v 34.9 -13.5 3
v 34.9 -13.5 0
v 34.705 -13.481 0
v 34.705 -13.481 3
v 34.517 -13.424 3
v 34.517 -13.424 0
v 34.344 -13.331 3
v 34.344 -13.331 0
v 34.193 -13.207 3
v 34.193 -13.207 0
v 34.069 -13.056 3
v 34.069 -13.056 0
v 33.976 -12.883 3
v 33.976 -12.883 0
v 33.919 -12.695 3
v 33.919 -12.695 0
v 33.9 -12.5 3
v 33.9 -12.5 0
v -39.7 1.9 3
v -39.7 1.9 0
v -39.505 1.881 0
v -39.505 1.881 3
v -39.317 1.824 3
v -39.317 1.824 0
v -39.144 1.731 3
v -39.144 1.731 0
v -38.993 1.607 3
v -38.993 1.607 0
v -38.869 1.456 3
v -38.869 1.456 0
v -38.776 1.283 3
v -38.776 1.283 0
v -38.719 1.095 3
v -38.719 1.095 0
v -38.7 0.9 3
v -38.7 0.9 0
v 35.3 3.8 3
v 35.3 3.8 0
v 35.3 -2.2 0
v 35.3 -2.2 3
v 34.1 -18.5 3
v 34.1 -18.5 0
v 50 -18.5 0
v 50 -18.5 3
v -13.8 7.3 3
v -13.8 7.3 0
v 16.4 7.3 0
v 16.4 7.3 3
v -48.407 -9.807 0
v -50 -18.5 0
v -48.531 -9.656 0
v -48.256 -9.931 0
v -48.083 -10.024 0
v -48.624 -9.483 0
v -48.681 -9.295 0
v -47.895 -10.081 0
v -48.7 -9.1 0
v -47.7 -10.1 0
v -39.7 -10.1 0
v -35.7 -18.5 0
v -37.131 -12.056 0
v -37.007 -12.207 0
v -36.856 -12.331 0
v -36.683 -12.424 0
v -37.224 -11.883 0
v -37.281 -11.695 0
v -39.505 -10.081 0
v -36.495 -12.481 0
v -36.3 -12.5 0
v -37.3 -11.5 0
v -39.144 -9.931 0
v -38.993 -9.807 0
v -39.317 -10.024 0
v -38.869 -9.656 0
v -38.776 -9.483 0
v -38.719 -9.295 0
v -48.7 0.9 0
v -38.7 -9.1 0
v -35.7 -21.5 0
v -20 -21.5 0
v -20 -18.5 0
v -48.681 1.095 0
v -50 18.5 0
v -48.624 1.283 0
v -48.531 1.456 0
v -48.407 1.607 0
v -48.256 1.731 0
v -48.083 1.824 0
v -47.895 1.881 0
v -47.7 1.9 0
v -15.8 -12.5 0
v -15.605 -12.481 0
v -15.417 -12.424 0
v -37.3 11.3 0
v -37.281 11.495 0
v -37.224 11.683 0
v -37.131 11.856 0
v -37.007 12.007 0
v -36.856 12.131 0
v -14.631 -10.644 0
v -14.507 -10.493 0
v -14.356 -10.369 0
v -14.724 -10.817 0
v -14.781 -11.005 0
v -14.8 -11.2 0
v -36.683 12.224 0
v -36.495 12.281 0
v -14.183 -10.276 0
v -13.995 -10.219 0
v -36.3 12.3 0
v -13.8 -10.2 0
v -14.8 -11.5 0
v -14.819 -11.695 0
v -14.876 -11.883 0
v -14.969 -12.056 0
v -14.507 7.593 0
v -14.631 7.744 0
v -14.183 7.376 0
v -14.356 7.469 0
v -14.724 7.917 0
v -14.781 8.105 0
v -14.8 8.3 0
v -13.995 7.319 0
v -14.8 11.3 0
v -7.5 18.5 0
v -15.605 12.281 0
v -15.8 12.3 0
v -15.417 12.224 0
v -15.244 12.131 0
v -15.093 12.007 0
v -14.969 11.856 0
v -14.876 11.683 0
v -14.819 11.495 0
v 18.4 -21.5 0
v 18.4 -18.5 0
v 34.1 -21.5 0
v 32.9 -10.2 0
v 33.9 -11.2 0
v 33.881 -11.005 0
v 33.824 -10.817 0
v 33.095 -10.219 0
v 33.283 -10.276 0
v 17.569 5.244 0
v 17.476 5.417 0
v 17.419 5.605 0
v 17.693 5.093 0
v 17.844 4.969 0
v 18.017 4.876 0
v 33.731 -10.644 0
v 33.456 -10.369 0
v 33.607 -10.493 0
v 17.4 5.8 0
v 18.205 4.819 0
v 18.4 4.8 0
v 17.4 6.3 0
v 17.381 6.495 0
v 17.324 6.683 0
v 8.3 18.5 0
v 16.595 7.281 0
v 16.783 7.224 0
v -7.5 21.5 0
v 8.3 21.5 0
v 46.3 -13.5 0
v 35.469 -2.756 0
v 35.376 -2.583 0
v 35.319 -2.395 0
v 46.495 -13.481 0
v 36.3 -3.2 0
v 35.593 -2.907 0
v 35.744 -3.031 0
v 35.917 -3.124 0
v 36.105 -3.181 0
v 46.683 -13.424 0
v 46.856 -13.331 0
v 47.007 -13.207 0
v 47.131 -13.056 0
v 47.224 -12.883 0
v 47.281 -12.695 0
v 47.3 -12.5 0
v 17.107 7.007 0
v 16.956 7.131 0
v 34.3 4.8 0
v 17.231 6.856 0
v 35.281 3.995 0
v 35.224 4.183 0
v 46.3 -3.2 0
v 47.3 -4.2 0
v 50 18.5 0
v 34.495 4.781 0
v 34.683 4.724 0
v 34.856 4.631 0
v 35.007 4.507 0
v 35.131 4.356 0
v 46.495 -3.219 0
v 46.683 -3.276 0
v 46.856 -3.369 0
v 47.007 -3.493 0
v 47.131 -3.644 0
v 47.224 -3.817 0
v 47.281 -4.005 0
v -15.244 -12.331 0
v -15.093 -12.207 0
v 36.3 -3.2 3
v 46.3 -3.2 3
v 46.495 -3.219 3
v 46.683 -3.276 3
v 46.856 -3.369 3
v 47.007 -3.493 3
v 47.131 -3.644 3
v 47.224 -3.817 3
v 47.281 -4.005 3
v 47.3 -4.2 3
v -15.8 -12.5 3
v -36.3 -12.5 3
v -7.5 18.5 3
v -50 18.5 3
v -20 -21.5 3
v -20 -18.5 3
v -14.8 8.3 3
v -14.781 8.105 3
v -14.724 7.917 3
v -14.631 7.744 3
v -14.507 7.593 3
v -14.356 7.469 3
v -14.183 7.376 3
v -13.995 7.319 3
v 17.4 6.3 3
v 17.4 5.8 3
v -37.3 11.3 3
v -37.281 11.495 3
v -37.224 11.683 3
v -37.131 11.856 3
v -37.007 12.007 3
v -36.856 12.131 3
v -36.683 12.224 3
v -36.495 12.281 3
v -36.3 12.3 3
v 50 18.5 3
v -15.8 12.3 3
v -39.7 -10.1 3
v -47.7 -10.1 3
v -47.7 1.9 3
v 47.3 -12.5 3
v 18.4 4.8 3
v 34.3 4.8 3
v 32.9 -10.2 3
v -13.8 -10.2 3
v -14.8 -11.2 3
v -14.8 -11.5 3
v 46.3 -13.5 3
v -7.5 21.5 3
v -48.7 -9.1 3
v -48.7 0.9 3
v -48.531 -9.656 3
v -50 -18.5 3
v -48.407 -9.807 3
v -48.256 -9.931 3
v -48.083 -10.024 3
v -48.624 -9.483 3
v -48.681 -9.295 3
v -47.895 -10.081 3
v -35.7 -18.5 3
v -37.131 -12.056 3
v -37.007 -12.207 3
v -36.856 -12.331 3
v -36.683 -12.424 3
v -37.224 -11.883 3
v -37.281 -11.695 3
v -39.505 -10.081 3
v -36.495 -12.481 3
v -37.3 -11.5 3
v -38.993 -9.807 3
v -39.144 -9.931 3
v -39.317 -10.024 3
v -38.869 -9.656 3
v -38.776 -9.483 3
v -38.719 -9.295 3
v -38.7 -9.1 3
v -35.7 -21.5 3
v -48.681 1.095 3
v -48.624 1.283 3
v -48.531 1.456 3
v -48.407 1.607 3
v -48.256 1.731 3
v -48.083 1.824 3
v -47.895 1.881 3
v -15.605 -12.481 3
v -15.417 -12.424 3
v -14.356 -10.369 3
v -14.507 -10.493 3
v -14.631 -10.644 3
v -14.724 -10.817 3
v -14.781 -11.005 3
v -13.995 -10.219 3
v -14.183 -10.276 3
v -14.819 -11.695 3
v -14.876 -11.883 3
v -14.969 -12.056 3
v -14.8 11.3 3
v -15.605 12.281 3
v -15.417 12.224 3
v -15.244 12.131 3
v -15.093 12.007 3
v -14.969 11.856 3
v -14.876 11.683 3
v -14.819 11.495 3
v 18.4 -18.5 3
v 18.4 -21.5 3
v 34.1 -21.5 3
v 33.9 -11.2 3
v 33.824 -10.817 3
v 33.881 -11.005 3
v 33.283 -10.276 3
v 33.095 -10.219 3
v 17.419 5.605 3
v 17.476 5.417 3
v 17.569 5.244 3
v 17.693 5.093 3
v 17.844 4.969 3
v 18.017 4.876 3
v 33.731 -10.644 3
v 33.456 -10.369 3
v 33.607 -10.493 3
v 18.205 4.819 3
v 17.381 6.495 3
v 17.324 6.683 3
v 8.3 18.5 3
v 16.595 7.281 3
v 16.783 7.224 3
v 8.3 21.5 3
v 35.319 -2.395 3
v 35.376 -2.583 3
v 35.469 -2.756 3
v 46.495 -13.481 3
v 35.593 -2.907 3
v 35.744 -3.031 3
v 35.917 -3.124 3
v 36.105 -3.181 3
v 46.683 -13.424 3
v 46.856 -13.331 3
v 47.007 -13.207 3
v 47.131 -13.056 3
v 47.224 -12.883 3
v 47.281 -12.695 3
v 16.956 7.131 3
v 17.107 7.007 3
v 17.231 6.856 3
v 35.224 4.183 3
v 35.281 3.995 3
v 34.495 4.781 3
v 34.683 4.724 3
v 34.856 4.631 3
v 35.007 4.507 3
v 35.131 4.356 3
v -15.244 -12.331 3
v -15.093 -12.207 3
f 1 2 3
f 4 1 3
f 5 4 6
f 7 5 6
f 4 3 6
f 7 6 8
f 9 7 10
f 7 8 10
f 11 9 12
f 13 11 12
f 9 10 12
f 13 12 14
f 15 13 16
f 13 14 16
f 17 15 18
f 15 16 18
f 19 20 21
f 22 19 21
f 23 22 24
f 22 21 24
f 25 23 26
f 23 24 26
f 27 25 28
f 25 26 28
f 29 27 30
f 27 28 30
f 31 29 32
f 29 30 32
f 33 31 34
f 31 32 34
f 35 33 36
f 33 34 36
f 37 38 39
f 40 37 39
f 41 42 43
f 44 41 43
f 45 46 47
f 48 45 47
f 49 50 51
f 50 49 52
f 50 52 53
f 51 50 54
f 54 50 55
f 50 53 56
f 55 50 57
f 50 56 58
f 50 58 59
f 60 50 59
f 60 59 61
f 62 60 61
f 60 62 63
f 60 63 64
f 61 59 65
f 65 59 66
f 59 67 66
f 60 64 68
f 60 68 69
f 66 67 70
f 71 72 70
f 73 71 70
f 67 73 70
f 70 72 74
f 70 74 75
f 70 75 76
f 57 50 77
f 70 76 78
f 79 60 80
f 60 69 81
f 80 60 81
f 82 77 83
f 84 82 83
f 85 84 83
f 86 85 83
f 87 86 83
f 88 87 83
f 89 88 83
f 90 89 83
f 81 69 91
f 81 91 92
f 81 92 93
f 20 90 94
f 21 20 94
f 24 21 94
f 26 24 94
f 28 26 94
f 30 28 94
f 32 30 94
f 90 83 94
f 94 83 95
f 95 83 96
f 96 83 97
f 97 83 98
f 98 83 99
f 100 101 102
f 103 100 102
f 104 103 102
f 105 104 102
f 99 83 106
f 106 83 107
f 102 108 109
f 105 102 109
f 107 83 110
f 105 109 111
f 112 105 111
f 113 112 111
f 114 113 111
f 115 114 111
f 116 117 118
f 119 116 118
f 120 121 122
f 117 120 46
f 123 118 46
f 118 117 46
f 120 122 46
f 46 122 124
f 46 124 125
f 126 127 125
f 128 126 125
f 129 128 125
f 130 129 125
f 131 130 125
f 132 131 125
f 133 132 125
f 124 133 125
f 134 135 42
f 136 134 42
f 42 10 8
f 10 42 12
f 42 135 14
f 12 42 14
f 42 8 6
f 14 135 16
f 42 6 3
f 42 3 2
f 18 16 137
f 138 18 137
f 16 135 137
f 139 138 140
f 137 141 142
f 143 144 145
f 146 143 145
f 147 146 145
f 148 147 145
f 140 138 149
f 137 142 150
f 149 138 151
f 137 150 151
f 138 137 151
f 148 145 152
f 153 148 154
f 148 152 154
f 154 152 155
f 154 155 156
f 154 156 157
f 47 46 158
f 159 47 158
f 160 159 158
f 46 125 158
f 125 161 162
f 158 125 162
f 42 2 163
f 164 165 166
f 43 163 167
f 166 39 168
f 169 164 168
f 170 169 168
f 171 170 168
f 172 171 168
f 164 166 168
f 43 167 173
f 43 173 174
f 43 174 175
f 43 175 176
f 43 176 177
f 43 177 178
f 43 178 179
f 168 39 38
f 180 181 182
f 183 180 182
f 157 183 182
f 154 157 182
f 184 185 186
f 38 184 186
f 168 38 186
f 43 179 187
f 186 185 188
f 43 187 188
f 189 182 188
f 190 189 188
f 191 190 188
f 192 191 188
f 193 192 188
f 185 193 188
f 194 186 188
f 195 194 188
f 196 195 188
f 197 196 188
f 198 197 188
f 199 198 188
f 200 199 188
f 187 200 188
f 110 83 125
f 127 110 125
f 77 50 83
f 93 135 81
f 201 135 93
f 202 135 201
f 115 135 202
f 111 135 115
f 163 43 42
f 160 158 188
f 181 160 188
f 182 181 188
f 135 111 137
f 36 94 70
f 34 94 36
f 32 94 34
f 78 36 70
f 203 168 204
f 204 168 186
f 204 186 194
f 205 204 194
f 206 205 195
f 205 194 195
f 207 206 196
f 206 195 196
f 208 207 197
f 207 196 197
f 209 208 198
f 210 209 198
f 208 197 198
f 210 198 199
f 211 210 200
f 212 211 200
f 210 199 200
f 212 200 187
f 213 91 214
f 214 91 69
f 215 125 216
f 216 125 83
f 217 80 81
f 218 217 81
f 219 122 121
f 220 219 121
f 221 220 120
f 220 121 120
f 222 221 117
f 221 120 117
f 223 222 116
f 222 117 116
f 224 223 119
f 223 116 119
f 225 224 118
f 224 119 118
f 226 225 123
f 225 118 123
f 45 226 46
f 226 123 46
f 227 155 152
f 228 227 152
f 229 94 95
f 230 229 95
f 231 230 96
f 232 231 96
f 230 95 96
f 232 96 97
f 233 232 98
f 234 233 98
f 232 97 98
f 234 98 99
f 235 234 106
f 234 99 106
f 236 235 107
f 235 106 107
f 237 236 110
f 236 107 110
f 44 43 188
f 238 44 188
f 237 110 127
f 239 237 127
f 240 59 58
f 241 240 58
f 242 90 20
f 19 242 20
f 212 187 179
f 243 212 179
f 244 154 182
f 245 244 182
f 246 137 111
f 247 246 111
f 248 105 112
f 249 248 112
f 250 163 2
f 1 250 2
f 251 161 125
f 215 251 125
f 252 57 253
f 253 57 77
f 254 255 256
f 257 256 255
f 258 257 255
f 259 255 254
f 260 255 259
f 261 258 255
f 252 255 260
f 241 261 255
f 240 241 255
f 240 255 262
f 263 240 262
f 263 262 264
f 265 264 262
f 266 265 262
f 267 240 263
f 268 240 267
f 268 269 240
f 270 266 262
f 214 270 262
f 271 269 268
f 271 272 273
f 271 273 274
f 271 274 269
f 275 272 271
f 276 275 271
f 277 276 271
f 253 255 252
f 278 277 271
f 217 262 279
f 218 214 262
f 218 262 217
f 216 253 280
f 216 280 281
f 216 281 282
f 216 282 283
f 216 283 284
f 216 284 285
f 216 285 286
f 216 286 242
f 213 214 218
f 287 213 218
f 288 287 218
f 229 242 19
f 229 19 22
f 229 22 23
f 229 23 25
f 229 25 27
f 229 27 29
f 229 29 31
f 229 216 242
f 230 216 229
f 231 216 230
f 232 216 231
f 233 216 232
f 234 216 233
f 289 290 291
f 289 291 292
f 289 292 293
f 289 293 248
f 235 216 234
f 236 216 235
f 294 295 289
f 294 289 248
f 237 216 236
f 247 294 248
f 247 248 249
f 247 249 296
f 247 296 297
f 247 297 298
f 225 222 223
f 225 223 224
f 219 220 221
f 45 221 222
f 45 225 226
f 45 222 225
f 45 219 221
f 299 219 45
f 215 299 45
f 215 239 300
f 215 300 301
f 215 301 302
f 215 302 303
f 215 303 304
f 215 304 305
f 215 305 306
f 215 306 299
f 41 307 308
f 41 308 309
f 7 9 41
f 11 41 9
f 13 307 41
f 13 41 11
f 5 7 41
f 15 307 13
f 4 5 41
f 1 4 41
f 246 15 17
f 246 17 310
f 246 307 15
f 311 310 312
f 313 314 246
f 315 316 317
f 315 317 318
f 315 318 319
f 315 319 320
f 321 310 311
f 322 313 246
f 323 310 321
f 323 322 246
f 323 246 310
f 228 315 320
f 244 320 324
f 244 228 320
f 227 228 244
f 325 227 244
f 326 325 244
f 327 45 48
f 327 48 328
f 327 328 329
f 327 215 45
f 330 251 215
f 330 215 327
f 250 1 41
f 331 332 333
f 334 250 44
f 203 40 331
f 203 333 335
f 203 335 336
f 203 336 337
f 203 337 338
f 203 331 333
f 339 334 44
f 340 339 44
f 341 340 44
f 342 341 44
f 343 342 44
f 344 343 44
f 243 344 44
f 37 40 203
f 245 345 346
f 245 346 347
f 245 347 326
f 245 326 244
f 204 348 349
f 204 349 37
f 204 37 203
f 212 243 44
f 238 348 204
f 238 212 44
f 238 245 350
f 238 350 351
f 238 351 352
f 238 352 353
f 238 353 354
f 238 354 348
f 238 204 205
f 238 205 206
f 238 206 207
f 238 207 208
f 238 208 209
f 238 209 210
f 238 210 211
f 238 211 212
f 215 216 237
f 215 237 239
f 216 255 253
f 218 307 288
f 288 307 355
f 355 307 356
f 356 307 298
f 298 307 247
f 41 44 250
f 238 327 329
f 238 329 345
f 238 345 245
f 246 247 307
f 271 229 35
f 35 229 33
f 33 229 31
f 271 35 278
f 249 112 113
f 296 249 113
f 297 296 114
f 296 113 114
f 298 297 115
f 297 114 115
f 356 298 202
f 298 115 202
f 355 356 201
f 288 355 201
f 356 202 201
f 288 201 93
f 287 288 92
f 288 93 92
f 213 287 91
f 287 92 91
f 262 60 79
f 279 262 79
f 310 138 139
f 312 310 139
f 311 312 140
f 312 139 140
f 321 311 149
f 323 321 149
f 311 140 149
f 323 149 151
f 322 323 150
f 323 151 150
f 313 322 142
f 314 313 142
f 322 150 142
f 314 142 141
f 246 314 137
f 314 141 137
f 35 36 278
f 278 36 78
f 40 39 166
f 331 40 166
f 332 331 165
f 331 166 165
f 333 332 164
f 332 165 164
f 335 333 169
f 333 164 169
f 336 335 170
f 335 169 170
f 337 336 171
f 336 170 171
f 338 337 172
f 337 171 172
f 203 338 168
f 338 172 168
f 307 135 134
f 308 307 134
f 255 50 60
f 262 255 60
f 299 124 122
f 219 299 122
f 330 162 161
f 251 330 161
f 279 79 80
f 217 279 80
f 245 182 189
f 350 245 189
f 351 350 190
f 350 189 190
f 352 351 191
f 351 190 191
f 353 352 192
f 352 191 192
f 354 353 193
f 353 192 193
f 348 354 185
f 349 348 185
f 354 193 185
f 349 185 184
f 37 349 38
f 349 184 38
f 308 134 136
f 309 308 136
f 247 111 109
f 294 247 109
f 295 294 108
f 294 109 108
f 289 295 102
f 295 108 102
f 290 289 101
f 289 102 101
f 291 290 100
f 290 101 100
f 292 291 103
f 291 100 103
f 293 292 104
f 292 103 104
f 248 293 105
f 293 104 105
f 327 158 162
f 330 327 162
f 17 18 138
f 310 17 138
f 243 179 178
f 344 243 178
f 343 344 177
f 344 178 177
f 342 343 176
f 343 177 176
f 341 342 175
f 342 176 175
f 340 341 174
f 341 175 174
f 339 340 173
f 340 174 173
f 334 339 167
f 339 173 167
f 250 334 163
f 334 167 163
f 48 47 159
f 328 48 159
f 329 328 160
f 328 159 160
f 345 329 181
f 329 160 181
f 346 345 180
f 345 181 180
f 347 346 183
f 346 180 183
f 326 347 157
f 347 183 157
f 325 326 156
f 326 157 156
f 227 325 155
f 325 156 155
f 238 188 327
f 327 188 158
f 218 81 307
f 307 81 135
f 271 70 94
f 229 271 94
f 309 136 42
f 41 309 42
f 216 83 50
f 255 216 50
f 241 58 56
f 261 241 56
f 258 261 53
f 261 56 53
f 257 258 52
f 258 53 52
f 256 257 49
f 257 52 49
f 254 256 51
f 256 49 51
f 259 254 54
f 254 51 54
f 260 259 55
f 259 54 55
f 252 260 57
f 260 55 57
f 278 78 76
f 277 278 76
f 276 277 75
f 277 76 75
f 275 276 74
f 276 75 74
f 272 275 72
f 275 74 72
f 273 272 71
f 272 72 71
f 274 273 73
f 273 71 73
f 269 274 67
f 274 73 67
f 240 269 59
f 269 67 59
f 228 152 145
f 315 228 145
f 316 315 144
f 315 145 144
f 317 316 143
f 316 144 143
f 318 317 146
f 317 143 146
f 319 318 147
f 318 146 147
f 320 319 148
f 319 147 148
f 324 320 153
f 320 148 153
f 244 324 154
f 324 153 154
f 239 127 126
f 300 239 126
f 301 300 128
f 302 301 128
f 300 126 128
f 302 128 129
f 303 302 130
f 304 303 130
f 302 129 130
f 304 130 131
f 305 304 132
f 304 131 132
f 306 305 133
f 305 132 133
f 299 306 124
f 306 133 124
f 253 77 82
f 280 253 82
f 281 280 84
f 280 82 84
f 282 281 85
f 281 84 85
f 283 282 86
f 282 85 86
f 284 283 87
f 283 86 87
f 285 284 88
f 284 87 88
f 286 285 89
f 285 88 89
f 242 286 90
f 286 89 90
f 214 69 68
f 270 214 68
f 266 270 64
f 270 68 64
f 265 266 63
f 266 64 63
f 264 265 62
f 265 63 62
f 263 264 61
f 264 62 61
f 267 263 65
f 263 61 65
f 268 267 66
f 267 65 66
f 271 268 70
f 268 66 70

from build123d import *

# Parameters (mm, degrees)
SALIENTE_EXTRUIR1_DEPTH = 3


with BuildPart() as part:
    # Croquis1 → Saliente-Extruir1 (new body)
    with BuildSketch(Plane.XY):
        Polygon((8.3, 21.5), (-7.5, 21.5), (-7.5, 18.5), (-50, 18.5), (-50, -18.5), (-35.7, -18.5), (-35.7, -21.5), (-20, -21.5), (-20, -18.5), (18.4, -18.5), (18.4, -21.5), (34.1, -21.5), (34.1, -18.5), (50, -18.5), (50, 18.5), (8.3, 18.5), align=None)
        with BuildLine():
            ThreePointArc((-48.7, 0.9), (-48.407106781, 1.607106781), (-47.7, 1.9))
            Line((-47.7, 1.9), (-39.7, 1.9))
            ThreePointArc((-39.7, 1.9), (-38.992893219, 1.607106781), (-38.7, 0.9))
            Line((-38.7, 0.9), (-38.7, -9.1))
            ThreePointArc((-38.7, -9.1), (-38.992893219, -9.807106781), (-39.7, -10.1))
            Line((-39.7, -10.1), (-47.7, -10.1))
            ThreePointArc((-47.7, -10.1), (-48.407106781, -9.807106781), (-48.7, -9.1))
            Line((-48.7, -9.1), (-48.7, 0.9))
        make_face(mode=Mode.SUBTRACT)
        with BuildLine():
            ThreePointArc((-13.8, -10.2), (-14.507106781, -10.492893219), (-14.8, -11.2))
            Line((-14.8, -11.2), (-14.8, -11.5))
            ThreePointArc((-14.8, -11.5), (-15.092893219, -12.207106781), (-15.8, -12.5))
            Line((-15.8, -12.5), (-36.3, -12.5))
            ThreePointArc((-36.3, -12.5), (-37.007106781, -12.207106781), (-37.3, -11.5))
            Line((-37.3, -11.5), (-37.3, 11.3))
            ThreePointArc((-37.3, 11.3), (-37.007106781, 12.007106781), (-36.3, 12.3))
            Line((-36.3, 12.3), (-15.8, 12.3))
            ThreePointArc((-15.8, 12.3), (-15.092893219, 12.007106781), (-14.8, 11.3))
            Line((-14.8, 11.3), (-14.8, 8.3))
            ThreePointArc((-14.8, 8.3), (-14.507106781, 7.592893219), (-13.8, 7.3))
            Line((-13.8, 7.3), (16.4, 7.3))
            ThreePointArc((16.4, 7.3), (17.107106781, 7.007106781), (17.4, 6.3))
            Line((17.4, 6.3), (17.4, 5.8))
            ThreePointArc((17.4, 5.8), (17.692893219, 5.092893219), (18.4, 4.8))
            Line((18.4, 4.8), (34.3, 4.8))
            ThreePointArc((34.3, 4.8), (35.007106781, 4.507106781), (35.3, 3.8))
            Line((35.3, 3.8), (35.3, -2.2))
            ThreePointArc((35.3, -2.2), (35.592893219, -2.907106781), (36.3, -3.2))
            Line((36.3, -3.2), (46.3, -3.2))
            ThreePointArc((46.3, -3.2), (47.007106781, -3.492893219), (47.3, -4.2))
            Line((47.3, -4.2), (47.3, -12.5))
            ThreePointArc((47.3, -12.5), (47.007106781, -13.207106781), (46.3, -13.5))
            Line((46.3, -13.5), (34.9, -13.5))
            ThreePointArc((34.9, -13.5), (34.192893219, -13.207106781), (33.9, -12.5))
            Line((33.9, -12.5), (33.9, -11.2))
            ThreePointArc((33.9, -11.2), (33.607106781, -10.492893219), (32.9, -10.2))
            Line((32.9, -10.2), (17.4, -10.2))
            Line((17.4, -10.2), (-13.8, -10.2))
        make_face(mode=Mode.SUBTRACT)
    extrude(amount=SALIENTE_EXTRUIR1_DEPTH)


solid = part.part
